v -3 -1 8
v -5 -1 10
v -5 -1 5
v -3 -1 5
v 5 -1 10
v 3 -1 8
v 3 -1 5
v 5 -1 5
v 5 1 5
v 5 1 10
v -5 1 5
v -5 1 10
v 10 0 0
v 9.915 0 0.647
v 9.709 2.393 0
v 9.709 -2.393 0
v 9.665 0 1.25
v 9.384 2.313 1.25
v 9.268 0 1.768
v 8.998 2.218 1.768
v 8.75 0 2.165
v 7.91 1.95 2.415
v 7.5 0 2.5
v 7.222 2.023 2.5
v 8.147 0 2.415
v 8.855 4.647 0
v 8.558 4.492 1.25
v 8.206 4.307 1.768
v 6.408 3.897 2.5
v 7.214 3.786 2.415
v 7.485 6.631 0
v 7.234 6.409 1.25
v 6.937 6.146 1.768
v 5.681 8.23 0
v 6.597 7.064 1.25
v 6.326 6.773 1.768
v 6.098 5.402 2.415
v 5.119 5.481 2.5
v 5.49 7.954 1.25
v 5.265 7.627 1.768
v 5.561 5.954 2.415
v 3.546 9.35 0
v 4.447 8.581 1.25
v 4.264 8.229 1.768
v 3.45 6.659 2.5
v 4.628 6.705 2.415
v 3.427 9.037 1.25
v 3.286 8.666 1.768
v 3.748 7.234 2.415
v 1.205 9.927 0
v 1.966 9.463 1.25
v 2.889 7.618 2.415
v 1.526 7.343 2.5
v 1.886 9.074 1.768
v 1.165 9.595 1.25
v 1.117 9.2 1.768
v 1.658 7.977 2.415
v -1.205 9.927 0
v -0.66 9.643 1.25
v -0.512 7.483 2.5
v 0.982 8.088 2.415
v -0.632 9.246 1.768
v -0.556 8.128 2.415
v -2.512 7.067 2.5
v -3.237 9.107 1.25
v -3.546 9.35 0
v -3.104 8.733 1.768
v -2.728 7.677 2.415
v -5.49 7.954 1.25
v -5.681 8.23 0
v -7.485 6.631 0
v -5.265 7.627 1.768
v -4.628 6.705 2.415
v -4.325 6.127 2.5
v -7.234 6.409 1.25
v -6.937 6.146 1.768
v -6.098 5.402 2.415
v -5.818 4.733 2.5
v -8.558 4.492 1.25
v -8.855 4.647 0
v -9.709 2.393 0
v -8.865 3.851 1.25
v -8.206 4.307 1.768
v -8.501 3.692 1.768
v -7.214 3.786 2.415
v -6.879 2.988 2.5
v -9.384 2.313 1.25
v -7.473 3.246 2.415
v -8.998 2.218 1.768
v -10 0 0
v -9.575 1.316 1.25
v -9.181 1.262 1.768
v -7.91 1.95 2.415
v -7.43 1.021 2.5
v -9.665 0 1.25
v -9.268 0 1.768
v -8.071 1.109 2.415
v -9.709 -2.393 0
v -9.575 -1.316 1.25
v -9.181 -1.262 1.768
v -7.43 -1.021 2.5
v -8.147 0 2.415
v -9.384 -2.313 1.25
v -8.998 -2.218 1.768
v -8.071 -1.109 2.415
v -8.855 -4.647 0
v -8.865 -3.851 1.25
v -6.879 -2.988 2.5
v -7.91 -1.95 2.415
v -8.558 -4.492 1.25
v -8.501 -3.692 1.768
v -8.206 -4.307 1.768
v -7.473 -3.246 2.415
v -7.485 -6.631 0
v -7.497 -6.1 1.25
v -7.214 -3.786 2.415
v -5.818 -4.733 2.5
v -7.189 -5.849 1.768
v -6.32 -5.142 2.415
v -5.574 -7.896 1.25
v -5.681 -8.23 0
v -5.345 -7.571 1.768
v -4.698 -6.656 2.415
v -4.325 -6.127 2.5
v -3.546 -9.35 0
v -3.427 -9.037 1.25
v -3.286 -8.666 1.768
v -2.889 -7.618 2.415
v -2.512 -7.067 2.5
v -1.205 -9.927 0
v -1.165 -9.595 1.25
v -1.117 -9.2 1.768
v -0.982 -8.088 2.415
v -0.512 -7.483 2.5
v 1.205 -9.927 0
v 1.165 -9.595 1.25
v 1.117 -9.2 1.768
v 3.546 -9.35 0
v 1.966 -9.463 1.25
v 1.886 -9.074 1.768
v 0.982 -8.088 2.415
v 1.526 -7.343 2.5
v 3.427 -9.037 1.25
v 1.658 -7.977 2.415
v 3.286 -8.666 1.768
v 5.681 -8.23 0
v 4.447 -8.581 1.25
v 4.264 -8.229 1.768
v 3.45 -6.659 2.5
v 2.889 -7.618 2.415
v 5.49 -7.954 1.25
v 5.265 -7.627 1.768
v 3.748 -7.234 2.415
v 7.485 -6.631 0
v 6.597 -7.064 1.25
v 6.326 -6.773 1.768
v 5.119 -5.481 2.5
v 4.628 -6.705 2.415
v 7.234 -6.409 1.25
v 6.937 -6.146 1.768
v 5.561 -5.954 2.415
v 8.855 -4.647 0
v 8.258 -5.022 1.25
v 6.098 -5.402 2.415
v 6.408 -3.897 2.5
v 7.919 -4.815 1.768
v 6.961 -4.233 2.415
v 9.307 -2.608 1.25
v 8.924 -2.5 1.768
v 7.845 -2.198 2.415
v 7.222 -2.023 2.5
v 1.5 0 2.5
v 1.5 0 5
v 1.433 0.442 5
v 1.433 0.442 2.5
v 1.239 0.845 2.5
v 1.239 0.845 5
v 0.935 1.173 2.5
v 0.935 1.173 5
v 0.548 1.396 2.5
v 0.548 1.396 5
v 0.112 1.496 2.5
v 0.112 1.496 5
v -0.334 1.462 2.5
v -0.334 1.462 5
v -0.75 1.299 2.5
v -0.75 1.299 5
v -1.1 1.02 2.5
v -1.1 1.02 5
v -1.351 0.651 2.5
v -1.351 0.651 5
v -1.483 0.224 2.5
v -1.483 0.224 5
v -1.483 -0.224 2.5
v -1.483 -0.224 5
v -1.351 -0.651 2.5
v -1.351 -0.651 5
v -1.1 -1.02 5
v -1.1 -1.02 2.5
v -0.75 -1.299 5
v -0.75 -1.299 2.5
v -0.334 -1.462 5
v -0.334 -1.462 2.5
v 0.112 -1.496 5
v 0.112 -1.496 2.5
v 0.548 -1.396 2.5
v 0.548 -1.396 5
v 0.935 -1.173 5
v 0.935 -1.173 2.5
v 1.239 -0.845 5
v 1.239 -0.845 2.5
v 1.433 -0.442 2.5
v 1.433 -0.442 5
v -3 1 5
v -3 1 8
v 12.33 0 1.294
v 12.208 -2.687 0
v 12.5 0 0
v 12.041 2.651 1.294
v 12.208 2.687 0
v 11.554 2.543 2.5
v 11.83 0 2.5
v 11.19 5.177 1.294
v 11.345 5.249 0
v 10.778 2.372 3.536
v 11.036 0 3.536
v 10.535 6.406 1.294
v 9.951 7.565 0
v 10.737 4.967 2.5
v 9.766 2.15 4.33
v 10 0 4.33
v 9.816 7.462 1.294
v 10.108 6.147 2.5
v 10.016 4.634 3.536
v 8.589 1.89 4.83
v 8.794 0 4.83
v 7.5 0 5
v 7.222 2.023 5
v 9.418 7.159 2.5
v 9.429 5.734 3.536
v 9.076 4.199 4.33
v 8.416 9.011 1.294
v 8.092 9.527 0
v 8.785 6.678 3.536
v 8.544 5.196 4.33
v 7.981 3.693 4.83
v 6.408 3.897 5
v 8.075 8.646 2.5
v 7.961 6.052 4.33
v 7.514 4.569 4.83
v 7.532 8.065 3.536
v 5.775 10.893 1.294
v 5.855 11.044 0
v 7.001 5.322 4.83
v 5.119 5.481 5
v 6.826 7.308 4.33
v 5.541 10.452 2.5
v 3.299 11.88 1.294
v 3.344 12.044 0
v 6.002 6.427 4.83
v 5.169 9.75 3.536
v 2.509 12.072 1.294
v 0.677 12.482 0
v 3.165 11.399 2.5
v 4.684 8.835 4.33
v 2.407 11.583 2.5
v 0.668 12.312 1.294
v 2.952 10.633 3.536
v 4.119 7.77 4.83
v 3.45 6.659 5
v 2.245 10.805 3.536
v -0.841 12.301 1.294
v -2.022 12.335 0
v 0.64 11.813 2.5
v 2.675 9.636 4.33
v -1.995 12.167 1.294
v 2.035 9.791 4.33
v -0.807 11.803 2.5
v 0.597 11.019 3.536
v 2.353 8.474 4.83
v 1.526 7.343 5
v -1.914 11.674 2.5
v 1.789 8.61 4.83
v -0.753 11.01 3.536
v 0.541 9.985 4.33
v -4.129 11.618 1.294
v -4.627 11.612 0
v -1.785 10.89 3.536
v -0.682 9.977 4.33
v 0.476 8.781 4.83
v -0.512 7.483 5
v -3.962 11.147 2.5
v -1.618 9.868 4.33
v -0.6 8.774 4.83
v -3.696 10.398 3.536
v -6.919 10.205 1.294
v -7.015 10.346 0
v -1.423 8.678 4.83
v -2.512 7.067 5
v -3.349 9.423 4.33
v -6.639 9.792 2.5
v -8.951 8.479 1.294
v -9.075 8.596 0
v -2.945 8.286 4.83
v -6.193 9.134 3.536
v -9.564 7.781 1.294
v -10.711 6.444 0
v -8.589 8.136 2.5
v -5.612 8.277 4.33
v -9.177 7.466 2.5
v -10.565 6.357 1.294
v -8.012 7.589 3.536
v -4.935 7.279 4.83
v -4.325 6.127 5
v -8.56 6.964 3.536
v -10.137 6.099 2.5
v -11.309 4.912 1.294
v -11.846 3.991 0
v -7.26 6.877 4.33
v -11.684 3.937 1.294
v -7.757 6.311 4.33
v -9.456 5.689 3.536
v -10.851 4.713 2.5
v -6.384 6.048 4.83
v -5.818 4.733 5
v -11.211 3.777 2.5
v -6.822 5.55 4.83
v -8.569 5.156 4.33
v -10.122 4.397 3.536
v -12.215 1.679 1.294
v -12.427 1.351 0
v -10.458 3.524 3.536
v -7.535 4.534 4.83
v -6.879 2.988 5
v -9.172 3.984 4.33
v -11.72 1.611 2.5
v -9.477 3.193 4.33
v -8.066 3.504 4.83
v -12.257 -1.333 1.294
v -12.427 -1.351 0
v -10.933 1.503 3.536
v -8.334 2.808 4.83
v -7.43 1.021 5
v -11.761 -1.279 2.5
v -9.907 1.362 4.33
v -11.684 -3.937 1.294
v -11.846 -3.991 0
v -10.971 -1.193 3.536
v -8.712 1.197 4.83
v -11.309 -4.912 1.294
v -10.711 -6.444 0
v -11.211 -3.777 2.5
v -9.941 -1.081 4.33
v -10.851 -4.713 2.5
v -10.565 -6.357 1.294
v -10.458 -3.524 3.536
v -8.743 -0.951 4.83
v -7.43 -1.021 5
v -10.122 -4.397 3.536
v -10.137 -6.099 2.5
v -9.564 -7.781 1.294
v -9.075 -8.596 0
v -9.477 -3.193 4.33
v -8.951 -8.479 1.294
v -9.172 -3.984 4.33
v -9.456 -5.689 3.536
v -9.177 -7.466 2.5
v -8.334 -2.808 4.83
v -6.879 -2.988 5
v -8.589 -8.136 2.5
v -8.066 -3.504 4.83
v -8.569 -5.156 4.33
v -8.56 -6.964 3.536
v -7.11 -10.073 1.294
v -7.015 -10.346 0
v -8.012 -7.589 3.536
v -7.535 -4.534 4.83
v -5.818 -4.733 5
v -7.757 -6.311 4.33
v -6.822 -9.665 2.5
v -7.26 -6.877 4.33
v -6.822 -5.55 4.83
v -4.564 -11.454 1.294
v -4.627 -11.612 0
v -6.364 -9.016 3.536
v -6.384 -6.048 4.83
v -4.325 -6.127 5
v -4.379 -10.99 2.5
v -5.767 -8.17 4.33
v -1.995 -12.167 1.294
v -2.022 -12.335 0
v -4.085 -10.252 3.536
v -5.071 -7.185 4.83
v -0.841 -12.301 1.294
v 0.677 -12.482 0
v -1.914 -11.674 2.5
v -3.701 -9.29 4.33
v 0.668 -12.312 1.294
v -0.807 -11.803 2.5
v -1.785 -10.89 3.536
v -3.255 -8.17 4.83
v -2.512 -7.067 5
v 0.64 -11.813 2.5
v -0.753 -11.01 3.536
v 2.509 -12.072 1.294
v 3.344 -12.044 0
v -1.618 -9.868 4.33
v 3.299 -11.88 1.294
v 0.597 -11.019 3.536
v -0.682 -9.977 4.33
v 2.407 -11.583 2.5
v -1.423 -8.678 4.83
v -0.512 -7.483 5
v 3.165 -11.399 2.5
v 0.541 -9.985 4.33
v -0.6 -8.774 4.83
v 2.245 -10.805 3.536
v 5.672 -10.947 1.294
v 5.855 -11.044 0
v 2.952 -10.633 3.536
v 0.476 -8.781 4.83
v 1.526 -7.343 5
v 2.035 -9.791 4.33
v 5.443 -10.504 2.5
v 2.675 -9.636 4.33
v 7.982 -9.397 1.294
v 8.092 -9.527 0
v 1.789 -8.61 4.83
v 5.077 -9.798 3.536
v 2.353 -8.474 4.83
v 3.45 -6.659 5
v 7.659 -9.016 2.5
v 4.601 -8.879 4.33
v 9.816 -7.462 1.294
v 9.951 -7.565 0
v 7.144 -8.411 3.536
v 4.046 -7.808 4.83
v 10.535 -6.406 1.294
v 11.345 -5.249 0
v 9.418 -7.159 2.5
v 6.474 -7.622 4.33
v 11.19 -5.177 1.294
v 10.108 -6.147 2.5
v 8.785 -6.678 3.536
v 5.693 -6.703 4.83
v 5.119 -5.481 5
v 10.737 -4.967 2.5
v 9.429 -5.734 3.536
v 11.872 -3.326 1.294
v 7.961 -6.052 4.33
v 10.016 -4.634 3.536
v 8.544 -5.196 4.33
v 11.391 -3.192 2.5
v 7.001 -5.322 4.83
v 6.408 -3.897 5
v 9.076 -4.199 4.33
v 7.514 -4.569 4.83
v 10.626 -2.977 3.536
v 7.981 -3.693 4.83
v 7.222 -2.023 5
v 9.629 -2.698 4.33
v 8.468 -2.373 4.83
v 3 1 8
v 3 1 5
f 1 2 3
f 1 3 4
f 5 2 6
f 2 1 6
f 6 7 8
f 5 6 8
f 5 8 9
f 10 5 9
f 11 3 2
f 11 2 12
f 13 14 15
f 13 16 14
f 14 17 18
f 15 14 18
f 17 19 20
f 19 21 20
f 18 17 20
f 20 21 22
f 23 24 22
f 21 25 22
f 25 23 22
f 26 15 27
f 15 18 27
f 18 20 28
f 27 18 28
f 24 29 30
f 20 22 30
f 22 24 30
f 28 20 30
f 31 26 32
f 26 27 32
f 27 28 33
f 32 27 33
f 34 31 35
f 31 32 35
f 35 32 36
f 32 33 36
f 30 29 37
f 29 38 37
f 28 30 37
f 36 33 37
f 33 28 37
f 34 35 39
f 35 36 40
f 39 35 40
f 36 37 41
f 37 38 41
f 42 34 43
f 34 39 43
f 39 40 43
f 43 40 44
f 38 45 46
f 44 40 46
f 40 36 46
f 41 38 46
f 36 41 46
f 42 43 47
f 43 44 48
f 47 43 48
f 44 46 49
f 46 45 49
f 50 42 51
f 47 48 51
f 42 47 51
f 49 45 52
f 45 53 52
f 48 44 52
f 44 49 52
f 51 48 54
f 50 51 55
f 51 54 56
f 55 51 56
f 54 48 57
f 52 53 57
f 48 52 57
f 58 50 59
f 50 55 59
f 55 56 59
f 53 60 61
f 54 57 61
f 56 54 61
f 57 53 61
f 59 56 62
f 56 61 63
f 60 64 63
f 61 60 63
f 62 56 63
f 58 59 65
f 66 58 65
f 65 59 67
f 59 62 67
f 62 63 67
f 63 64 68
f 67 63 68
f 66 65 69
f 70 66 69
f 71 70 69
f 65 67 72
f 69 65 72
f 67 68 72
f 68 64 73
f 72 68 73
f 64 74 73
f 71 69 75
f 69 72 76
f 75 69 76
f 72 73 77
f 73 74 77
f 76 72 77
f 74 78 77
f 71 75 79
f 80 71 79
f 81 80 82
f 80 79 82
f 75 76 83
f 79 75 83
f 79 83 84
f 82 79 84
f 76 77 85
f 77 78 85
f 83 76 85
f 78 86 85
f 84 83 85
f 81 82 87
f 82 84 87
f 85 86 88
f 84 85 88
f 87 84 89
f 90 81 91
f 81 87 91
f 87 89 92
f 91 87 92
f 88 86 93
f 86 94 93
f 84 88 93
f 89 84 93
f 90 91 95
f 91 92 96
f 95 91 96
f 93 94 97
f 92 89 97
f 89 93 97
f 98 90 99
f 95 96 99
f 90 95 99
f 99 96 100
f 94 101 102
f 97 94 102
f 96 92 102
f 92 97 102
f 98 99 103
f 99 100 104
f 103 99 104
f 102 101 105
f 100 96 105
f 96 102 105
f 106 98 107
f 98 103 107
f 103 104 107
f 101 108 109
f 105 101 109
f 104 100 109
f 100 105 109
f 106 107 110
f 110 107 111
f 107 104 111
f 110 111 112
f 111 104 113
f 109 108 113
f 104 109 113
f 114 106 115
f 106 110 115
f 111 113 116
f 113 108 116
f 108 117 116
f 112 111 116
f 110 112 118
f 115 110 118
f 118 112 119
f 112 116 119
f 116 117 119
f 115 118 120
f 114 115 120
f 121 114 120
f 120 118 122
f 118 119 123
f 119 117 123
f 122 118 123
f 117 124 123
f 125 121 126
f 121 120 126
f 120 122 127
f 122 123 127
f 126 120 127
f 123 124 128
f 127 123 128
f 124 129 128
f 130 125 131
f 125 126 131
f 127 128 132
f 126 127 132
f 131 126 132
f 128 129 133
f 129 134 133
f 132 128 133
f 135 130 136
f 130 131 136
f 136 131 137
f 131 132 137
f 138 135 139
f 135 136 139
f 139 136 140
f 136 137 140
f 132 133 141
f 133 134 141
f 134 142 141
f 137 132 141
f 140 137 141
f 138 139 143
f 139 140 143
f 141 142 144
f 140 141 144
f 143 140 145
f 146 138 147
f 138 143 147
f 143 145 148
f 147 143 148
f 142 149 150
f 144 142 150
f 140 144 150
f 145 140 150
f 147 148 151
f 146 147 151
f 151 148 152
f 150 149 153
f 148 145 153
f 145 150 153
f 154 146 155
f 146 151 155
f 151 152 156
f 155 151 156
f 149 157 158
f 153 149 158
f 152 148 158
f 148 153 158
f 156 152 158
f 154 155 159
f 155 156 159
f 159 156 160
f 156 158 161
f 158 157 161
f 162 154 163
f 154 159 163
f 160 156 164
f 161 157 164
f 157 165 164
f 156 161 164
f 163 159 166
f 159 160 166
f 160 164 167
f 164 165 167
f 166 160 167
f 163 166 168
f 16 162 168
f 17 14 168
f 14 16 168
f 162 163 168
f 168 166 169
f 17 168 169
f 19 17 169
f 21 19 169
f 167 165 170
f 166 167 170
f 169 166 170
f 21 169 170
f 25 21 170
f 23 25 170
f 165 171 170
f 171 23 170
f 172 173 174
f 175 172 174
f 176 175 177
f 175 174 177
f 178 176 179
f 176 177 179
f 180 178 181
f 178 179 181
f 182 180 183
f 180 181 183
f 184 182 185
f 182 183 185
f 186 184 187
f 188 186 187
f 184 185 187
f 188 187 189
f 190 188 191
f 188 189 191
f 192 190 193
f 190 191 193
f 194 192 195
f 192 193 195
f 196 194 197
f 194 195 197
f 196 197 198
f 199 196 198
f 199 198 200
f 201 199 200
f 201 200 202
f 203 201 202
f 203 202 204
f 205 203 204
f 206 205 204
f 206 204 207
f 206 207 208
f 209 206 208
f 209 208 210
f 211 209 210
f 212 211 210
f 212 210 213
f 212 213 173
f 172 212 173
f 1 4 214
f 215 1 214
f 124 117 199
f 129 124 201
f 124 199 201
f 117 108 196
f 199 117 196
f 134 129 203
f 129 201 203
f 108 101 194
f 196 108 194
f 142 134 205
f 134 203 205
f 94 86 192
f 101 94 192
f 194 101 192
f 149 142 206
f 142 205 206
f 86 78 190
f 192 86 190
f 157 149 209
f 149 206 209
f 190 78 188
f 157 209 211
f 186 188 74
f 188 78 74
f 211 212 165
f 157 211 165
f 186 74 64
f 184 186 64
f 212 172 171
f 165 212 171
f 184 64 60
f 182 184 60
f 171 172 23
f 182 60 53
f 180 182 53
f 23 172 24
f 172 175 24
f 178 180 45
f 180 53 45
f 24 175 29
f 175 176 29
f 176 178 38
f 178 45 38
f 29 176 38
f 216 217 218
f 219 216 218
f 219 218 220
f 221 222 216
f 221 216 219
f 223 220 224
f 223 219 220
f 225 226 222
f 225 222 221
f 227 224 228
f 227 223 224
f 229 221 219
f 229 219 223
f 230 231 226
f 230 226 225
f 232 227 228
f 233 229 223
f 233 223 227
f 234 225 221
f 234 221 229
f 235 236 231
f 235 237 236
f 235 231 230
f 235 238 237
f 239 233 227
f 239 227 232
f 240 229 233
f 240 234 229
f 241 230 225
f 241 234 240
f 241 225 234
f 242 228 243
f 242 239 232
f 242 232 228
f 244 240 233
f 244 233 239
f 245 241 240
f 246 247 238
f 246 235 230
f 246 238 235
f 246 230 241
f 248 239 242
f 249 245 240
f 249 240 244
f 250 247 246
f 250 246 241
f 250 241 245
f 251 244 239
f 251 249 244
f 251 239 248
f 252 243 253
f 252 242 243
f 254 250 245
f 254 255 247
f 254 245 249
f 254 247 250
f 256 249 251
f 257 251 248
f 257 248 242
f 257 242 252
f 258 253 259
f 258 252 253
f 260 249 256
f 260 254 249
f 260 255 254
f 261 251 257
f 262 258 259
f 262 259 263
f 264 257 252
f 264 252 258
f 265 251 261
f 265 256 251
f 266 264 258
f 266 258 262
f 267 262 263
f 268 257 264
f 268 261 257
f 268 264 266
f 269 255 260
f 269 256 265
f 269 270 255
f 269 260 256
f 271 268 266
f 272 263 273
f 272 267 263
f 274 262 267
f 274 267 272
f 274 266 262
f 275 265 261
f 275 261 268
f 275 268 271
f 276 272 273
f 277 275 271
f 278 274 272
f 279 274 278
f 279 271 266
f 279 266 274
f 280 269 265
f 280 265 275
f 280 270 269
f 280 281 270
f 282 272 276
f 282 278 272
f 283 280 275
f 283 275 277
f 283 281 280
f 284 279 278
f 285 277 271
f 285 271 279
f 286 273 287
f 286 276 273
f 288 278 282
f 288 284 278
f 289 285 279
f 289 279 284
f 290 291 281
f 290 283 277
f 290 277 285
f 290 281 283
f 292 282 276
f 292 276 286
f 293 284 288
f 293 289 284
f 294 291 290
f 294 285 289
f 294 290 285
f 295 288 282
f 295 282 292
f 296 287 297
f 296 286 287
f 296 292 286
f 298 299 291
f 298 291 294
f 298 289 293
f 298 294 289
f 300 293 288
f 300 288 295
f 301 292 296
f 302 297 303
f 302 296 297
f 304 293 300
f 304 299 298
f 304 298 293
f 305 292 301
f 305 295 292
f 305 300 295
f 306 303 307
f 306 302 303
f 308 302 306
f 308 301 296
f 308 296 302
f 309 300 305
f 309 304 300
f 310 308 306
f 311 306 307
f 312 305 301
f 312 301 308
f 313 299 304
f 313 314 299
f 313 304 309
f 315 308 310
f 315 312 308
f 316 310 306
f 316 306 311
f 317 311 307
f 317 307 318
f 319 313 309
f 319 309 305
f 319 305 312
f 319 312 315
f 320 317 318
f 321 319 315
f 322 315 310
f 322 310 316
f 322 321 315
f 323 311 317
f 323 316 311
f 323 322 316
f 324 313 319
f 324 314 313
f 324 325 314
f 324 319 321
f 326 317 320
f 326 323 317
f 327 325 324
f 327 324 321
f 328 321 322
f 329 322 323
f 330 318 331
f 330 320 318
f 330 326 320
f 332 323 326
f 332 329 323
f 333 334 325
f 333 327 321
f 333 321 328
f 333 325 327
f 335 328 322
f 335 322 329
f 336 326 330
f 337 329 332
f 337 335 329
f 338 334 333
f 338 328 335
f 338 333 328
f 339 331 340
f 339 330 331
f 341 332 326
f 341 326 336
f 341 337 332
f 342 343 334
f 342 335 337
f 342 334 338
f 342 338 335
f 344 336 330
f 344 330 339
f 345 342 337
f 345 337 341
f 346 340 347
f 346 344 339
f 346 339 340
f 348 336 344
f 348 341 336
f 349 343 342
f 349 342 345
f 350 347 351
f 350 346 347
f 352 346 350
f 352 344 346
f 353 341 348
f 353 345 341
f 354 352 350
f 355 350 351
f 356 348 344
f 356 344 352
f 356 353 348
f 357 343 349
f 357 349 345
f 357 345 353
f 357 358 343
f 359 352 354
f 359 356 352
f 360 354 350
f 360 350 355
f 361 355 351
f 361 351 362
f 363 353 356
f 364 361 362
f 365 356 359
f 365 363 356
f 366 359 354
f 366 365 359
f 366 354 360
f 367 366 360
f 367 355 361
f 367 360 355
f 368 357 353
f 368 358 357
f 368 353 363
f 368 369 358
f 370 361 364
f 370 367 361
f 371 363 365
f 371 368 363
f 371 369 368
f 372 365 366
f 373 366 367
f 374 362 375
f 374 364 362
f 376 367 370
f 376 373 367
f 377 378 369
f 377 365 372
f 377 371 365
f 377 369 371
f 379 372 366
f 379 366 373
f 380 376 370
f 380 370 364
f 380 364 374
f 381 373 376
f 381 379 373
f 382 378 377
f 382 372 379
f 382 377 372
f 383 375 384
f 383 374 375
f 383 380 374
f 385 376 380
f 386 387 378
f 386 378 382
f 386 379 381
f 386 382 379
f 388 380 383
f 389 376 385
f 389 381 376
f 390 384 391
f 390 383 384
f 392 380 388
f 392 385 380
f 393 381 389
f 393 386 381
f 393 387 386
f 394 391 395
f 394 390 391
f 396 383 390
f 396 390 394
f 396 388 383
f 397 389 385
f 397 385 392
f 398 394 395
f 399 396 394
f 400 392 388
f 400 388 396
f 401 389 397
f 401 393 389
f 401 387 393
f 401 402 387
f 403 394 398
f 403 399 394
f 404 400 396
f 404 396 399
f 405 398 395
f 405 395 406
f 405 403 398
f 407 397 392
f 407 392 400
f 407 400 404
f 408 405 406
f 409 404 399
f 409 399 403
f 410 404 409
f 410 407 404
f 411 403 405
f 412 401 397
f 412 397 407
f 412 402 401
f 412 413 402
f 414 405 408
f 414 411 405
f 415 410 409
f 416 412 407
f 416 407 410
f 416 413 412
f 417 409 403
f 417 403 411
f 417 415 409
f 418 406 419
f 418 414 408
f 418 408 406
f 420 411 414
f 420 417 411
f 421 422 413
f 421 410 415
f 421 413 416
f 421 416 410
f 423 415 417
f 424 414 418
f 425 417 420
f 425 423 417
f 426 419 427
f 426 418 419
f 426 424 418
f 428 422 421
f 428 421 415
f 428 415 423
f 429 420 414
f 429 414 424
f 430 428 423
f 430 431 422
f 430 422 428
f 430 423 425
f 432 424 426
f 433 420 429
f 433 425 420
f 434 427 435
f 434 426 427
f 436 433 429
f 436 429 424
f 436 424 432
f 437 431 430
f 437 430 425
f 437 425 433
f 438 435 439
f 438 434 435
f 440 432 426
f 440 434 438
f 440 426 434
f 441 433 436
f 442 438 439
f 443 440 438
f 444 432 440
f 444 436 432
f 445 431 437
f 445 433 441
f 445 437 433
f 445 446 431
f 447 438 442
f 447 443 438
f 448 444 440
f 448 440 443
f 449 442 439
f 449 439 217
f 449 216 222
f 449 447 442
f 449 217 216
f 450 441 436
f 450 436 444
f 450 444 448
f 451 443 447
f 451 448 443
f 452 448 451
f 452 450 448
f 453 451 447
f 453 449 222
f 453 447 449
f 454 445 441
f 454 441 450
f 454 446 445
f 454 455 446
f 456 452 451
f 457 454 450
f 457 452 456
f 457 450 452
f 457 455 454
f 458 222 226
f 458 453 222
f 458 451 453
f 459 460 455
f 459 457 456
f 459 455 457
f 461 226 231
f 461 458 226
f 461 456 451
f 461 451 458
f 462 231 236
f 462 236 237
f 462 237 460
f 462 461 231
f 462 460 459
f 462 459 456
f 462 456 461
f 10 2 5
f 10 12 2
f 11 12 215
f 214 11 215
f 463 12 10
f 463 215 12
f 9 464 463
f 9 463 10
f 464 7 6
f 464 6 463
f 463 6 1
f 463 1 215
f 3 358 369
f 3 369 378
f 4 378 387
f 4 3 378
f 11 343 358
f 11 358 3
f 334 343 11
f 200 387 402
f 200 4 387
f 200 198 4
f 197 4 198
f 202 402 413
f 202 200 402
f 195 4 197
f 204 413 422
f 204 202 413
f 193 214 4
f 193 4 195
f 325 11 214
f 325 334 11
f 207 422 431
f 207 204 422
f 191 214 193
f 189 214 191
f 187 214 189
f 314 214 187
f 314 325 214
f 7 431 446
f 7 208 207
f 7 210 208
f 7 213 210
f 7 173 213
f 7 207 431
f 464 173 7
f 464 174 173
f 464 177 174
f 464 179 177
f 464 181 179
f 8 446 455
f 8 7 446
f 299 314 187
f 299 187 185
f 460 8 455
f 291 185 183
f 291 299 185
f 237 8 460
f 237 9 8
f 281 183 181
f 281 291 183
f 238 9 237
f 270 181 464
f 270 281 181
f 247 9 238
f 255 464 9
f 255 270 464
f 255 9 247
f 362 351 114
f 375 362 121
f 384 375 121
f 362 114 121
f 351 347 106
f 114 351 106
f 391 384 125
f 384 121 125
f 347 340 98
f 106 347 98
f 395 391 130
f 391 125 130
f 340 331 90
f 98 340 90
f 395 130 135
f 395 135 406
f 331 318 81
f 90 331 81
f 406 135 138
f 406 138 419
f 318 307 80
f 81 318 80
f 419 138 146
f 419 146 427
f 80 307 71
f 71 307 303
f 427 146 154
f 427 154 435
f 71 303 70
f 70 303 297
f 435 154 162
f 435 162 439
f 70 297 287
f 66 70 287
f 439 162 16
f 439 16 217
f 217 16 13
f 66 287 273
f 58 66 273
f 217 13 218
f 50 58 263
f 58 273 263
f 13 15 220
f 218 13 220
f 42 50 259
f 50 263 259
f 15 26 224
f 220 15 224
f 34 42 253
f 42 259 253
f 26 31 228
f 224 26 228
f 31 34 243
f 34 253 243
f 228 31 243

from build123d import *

# Parameters (mm, degrees)
F0_R     = 12.5
F1_DEPTH = 5
F2_R     = 4.99999
F3_T     = 2.5
F4_R     = 1.5
F5_DEPTH = 25
F6_W     = 2
F6_H     = 2
F7_DEPTH = 5
F8_W     = 2
F8_H     = 2
F9_DEPTH = 10


# Not quite as in the source:
# - a fillet or chamfer is up to 0.001 mm smaller than in the source, because OpenCascade refuses the exact size
# - a shell that OpenCascade refuses in one call is made with other operations: the cavity is built on its own and cut out


with BuildPart() as f1:
    # F0 (on Top) → F1 (new body)
    with BuildSketch(Plane.XY):
        Circle(F0_R)
    extrude(amount=F1_DEPTH)

    # F2 (radius 5 in the source; OpenCascade refuses exactly that, so slightly less here)
    f2_edges = [f1.edges().sort_by_distance(p)[0] for p in [
        (-12.5, 0, 5),
    ]]
    fillet(f2_edges, radius=F2_R)

    # F3: shell of thickness 2.5, made by hand


with BuildPart() as f3_core1:
    # F3_t2: copy of F1
    add(f1.part)

    # the walls: a layer under each face that stays
    f3_faces = [f3_core1.faces().sort_by_distance(p)[0] for p in [
        (-12.5, 0, 5e-06),
        (-11.0355368349, 0, 3.5355368349),
        (0, 0, 5),
    ]]
    thicken(f3_faces, amount=-F3_T, mode=Mode.SUBTRACT)


with BuildPart() as f1_1:
    add(f1.part)

    # what is left inside the walls is the cavity
    f3_cavity = [f3_core1.part.solids().sort_by_distance(p)[0] for p in [
        (0, -3.333333, 0.025),
    ]]
    add(f3_cavity, mode=Mode.SUBTRACT)

    # F4 (on face) → F5 (cut)
    with BuildSketch(Plane.XY.offset(5)):
        Circle(F4_R)
    extrude(amount=-F5_DEPTH, mode=Mode.SUBTRACT)

    # F6 (on face) → F7 (join)
    with BuildSketch(Plane.XY.offset(5)):
        with Locations((4, 0)):
            Rectangle(F6_W, F6_H)
        with Locations((-4, 0)):
            Rectangle(F6_W, F6_H)
    extrude(amount=F7_DEPTH)

    # F8 (on face) → F9 (join)
    with BuildSketch(Plane.YZ.offset(5)):
        with Locations((0, 9)):
            Rectangle(F8_W, F8_H)
    extrude(amount=-F9_DEPTH)


solid = f1_1.part
